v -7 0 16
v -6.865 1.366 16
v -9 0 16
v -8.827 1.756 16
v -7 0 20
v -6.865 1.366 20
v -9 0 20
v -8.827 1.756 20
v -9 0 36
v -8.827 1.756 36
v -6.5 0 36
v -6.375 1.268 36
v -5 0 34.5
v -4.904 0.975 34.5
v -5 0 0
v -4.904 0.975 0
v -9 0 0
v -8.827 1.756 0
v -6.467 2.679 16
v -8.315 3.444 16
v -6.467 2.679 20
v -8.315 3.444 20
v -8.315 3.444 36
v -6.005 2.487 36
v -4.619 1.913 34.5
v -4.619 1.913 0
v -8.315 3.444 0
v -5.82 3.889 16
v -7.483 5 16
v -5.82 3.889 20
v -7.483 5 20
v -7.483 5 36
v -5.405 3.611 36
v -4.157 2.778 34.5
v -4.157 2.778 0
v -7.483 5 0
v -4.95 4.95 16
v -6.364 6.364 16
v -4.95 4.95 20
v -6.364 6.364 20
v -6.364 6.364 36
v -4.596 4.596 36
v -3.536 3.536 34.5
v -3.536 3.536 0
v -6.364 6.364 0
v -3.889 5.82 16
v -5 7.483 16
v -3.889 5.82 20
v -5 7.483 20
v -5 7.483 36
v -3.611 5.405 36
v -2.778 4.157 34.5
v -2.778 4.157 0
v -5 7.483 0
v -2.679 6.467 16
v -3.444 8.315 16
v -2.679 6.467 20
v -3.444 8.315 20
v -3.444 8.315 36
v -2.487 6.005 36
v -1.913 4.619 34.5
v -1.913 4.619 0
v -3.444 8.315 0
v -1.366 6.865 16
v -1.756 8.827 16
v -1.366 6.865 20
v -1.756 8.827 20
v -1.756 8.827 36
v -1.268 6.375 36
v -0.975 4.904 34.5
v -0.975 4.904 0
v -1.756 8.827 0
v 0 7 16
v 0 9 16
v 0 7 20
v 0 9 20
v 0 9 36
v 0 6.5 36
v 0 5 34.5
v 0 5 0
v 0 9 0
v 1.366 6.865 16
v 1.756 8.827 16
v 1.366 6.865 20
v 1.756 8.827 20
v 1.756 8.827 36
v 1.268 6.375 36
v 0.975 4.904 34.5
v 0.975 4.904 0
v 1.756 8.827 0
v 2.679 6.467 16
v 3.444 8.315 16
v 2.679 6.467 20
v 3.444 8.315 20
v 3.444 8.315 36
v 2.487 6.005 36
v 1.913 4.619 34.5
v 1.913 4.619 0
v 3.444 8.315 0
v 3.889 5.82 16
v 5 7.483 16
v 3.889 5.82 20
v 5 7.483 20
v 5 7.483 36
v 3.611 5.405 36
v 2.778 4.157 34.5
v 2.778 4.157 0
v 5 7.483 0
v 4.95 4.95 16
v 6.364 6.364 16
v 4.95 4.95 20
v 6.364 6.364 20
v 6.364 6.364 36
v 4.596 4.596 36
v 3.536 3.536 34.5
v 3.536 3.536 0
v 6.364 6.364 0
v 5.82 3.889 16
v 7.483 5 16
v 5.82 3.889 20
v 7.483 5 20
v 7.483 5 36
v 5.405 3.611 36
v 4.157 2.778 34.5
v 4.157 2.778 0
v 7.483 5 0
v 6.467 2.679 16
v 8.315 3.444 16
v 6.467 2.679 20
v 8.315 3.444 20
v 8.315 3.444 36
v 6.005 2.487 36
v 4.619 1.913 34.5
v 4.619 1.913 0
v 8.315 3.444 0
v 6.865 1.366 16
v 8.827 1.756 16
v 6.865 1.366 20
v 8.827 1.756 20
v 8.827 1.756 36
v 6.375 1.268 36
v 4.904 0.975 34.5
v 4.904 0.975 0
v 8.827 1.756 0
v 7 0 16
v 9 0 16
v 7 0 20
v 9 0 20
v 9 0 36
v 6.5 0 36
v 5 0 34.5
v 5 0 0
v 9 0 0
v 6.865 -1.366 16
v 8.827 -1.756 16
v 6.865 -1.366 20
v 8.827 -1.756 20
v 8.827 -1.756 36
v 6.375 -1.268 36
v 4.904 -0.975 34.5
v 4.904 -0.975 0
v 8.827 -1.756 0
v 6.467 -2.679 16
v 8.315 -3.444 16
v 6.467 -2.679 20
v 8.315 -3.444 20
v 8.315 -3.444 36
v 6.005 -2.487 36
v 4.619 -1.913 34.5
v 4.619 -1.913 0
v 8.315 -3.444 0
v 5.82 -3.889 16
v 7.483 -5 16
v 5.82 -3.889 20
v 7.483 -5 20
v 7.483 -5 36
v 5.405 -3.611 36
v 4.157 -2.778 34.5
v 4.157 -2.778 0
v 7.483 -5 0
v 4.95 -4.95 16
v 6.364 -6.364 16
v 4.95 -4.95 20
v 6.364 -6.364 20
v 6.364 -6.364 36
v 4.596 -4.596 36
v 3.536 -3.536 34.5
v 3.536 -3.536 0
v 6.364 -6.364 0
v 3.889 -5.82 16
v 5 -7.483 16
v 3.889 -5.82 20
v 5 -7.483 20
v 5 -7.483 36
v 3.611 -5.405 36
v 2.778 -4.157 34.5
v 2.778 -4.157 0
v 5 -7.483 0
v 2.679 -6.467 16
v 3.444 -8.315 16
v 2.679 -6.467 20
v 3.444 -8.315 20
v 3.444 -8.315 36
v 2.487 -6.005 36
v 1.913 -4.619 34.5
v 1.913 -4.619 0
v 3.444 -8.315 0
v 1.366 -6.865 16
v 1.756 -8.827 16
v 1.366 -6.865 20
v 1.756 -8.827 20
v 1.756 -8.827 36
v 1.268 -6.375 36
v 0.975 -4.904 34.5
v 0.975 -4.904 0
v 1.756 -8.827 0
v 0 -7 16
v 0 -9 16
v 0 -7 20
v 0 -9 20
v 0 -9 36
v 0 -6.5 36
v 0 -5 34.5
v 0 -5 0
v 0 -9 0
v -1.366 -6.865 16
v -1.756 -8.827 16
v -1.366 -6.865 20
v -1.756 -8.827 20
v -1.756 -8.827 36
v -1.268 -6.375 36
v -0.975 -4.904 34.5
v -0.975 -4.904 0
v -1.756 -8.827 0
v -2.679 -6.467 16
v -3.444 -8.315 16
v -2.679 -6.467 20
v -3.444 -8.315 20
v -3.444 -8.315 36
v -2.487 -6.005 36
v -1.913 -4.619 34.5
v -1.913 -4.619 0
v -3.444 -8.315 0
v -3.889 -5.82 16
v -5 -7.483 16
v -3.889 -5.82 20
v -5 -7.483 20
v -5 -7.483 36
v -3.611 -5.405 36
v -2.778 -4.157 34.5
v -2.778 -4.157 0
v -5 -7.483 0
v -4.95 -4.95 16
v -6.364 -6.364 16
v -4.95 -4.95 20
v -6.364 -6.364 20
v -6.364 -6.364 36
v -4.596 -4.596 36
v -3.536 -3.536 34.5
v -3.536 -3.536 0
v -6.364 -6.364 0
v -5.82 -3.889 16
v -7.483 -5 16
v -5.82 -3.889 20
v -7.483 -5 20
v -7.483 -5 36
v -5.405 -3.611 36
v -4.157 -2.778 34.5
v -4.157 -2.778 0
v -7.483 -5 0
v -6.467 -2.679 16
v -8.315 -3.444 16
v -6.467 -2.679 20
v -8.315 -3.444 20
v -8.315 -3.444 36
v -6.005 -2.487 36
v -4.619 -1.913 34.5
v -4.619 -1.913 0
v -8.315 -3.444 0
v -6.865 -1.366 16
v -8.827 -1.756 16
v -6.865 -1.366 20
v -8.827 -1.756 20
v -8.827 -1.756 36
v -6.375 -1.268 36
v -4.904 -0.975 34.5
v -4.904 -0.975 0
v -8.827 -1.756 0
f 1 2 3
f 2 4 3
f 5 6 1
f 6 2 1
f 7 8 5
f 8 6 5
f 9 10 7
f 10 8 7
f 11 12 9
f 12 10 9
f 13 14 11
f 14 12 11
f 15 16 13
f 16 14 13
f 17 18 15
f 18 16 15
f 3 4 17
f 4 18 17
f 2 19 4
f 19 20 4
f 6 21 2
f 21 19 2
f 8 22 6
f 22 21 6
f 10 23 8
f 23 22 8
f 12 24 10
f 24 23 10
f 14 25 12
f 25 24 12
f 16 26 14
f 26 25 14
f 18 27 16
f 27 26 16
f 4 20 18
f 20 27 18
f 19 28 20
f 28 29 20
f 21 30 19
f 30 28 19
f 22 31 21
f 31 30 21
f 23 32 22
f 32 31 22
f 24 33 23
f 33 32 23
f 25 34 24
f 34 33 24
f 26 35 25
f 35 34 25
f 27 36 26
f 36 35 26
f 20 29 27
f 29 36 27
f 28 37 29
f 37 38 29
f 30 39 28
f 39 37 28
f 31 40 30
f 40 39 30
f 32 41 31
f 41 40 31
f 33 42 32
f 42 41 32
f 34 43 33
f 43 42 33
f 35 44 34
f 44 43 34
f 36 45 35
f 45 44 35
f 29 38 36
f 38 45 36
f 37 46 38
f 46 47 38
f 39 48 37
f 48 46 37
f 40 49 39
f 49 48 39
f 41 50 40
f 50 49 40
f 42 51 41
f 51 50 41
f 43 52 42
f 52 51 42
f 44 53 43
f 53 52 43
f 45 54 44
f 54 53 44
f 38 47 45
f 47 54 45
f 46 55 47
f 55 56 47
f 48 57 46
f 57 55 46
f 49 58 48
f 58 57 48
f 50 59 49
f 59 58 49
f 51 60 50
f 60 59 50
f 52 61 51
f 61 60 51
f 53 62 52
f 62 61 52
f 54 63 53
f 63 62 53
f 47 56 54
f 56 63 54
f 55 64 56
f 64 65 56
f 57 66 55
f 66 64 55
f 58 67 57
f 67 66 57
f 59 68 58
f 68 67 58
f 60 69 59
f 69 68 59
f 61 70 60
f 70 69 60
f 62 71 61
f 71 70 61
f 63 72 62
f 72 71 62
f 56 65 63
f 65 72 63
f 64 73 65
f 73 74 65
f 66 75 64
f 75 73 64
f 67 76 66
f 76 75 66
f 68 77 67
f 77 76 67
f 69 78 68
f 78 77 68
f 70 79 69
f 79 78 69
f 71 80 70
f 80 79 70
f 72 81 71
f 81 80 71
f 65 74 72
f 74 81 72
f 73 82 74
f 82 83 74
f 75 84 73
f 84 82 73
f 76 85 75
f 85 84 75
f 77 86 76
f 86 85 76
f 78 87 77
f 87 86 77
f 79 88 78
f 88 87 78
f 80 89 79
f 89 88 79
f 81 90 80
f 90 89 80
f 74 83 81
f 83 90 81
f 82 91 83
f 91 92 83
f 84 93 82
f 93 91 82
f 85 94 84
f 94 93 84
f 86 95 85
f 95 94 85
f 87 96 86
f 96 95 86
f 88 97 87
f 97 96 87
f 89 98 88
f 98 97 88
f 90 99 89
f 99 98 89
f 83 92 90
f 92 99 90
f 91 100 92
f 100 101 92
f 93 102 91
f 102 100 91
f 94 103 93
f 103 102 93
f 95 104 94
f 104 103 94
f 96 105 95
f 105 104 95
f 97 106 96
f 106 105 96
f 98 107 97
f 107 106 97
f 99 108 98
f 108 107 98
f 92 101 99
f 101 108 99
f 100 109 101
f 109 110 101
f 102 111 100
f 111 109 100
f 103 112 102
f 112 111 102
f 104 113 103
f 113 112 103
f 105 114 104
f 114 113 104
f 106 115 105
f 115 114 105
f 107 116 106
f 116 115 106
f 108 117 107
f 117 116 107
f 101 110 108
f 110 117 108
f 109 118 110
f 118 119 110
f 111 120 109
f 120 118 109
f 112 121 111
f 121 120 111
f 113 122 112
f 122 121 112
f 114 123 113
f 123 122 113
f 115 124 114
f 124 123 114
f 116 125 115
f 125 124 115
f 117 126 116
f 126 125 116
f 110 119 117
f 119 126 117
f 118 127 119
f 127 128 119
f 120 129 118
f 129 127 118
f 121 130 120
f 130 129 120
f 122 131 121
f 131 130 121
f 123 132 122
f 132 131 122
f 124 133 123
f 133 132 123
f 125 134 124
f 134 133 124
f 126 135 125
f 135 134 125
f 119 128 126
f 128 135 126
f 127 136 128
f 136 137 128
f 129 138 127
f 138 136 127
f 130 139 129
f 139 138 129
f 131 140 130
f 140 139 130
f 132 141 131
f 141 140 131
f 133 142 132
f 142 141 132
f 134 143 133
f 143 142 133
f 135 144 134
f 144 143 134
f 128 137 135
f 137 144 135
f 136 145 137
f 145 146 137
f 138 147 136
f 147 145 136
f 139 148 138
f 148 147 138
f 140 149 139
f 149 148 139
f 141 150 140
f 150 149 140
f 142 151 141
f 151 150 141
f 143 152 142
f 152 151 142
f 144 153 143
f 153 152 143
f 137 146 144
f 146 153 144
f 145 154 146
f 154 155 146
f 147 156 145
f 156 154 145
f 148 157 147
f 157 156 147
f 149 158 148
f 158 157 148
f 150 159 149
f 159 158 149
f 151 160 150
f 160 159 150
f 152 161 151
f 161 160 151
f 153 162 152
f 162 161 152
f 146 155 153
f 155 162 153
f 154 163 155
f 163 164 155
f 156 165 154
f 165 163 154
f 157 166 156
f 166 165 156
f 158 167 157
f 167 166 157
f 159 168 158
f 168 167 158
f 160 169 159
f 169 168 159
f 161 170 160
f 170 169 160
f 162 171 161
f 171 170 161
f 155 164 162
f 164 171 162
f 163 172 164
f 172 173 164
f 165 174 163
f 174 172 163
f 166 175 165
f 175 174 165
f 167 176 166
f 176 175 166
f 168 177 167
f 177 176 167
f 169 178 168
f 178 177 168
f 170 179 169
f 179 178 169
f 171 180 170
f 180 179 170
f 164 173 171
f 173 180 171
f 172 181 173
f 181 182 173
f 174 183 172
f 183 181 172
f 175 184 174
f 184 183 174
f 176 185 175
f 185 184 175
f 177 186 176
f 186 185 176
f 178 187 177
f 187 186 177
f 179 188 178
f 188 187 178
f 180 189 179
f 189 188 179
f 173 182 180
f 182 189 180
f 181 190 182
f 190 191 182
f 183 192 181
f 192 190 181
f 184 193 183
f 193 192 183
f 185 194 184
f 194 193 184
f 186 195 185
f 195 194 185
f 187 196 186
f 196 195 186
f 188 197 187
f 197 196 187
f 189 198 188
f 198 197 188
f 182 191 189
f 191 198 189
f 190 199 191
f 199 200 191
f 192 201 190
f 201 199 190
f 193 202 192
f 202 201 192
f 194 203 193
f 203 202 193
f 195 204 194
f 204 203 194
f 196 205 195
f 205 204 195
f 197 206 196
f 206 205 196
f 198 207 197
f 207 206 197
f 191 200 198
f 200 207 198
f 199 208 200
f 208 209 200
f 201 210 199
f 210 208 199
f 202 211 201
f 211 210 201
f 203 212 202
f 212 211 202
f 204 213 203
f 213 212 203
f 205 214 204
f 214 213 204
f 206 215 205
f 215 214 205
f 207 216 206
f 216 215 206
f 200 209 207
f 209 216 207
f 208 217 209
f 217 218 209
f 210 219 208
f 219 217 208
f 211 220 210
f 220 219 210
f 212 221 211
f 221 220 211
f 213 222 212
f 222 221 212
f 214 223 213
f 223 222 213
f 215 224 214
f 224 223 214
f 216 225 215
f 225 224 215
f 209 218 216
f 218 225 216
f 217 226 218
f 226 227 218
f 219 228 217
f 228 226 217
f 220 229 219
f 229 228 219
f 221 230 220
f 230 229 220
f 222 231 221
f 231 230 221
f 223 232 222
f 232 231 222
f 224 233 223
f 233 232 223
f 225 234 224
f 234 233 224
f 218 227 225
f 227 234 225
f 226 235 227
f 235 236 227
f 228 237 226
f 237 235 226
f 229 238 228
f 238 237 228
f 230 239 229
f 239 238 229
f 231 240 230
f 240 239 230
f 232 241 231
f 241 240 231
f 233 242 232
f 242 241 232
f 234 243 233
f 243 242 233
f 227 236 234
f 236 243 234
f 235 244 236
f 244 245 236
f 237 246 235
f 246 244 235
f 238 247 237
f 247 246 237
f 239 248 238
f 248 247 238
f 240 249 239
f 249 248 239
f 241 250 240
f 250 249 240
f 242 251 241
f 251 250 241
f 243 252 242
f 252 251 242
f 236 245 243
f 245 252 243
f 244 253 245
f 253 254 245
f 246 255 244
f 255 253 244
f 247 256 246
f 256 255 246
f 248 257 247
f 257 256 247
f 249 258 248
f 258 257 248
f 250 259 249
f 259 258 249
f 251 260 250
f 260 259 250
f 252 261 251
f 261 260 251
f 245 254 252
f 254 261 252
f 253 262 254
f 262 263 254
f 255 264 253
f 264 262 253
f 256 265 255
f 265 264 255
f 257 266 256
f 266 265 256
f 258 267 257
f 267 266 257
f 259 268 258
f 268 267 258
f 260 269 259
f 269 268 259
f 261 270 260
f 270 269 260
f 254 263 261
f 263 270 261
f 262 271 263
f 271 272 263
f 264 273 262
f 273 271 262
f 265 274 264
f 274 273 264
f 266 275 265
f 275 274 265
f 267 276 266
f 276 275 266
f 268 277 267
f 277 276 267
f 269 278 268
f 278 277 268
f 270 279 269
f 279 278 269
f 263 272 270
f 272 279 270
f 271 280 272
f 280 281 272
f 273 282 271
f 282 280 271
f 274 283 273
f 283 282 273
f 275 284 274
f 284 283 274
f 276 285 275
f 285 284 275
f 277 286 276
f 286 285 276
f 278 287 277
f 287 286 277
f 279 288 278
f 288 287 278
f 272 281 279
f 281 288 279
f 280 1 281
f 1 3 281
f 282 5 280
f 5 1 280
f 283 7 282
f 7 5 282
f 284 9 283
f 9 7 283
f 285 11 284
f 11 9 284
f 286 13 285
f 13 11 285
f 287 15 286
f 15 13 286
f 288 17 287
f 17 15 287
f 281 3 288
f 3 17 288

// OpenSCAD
$fn = 32;

// ----------------------------------------------------------------------
// Grooved revolve: thread_relief, bore R5
// ----------------------------------------------------------------------

// --- parameters (mm) ---
bore_r = 5;               // bore radius
outer_r = 9;              // outer radius of the body
total_h = 36;             // overall height, Z
wall = 4;                 // radial wall thickness
groove_w = 4;             // groove width
groove_d = 2;             // groove depth
grooves = 1;              // number of outer grooves
relief = 1.5;             // thread relief leg at the bore mouth
relief_angle = 45;        // thread relief chamfer angle, degrees

bbox_x = 2 * outer_r;  // full diameter
bore_d = 2 * bore_r;  // bore diameter
body_d = 2 * outer_r;  // body diameter
revolve_angle = 360;  // full turn around the Z axis

profile = [[5, 0], [9, 0], [9, 16], [7, 16], [7, 20], [9, 20], [9, 36], [6.5, 36], [5, 34.5]];  // primary outline, 9 points, counter clockwise

// --- the one profile operation ---
rotate_extrude(angle = revolve_angle) polygon(points = profile);
